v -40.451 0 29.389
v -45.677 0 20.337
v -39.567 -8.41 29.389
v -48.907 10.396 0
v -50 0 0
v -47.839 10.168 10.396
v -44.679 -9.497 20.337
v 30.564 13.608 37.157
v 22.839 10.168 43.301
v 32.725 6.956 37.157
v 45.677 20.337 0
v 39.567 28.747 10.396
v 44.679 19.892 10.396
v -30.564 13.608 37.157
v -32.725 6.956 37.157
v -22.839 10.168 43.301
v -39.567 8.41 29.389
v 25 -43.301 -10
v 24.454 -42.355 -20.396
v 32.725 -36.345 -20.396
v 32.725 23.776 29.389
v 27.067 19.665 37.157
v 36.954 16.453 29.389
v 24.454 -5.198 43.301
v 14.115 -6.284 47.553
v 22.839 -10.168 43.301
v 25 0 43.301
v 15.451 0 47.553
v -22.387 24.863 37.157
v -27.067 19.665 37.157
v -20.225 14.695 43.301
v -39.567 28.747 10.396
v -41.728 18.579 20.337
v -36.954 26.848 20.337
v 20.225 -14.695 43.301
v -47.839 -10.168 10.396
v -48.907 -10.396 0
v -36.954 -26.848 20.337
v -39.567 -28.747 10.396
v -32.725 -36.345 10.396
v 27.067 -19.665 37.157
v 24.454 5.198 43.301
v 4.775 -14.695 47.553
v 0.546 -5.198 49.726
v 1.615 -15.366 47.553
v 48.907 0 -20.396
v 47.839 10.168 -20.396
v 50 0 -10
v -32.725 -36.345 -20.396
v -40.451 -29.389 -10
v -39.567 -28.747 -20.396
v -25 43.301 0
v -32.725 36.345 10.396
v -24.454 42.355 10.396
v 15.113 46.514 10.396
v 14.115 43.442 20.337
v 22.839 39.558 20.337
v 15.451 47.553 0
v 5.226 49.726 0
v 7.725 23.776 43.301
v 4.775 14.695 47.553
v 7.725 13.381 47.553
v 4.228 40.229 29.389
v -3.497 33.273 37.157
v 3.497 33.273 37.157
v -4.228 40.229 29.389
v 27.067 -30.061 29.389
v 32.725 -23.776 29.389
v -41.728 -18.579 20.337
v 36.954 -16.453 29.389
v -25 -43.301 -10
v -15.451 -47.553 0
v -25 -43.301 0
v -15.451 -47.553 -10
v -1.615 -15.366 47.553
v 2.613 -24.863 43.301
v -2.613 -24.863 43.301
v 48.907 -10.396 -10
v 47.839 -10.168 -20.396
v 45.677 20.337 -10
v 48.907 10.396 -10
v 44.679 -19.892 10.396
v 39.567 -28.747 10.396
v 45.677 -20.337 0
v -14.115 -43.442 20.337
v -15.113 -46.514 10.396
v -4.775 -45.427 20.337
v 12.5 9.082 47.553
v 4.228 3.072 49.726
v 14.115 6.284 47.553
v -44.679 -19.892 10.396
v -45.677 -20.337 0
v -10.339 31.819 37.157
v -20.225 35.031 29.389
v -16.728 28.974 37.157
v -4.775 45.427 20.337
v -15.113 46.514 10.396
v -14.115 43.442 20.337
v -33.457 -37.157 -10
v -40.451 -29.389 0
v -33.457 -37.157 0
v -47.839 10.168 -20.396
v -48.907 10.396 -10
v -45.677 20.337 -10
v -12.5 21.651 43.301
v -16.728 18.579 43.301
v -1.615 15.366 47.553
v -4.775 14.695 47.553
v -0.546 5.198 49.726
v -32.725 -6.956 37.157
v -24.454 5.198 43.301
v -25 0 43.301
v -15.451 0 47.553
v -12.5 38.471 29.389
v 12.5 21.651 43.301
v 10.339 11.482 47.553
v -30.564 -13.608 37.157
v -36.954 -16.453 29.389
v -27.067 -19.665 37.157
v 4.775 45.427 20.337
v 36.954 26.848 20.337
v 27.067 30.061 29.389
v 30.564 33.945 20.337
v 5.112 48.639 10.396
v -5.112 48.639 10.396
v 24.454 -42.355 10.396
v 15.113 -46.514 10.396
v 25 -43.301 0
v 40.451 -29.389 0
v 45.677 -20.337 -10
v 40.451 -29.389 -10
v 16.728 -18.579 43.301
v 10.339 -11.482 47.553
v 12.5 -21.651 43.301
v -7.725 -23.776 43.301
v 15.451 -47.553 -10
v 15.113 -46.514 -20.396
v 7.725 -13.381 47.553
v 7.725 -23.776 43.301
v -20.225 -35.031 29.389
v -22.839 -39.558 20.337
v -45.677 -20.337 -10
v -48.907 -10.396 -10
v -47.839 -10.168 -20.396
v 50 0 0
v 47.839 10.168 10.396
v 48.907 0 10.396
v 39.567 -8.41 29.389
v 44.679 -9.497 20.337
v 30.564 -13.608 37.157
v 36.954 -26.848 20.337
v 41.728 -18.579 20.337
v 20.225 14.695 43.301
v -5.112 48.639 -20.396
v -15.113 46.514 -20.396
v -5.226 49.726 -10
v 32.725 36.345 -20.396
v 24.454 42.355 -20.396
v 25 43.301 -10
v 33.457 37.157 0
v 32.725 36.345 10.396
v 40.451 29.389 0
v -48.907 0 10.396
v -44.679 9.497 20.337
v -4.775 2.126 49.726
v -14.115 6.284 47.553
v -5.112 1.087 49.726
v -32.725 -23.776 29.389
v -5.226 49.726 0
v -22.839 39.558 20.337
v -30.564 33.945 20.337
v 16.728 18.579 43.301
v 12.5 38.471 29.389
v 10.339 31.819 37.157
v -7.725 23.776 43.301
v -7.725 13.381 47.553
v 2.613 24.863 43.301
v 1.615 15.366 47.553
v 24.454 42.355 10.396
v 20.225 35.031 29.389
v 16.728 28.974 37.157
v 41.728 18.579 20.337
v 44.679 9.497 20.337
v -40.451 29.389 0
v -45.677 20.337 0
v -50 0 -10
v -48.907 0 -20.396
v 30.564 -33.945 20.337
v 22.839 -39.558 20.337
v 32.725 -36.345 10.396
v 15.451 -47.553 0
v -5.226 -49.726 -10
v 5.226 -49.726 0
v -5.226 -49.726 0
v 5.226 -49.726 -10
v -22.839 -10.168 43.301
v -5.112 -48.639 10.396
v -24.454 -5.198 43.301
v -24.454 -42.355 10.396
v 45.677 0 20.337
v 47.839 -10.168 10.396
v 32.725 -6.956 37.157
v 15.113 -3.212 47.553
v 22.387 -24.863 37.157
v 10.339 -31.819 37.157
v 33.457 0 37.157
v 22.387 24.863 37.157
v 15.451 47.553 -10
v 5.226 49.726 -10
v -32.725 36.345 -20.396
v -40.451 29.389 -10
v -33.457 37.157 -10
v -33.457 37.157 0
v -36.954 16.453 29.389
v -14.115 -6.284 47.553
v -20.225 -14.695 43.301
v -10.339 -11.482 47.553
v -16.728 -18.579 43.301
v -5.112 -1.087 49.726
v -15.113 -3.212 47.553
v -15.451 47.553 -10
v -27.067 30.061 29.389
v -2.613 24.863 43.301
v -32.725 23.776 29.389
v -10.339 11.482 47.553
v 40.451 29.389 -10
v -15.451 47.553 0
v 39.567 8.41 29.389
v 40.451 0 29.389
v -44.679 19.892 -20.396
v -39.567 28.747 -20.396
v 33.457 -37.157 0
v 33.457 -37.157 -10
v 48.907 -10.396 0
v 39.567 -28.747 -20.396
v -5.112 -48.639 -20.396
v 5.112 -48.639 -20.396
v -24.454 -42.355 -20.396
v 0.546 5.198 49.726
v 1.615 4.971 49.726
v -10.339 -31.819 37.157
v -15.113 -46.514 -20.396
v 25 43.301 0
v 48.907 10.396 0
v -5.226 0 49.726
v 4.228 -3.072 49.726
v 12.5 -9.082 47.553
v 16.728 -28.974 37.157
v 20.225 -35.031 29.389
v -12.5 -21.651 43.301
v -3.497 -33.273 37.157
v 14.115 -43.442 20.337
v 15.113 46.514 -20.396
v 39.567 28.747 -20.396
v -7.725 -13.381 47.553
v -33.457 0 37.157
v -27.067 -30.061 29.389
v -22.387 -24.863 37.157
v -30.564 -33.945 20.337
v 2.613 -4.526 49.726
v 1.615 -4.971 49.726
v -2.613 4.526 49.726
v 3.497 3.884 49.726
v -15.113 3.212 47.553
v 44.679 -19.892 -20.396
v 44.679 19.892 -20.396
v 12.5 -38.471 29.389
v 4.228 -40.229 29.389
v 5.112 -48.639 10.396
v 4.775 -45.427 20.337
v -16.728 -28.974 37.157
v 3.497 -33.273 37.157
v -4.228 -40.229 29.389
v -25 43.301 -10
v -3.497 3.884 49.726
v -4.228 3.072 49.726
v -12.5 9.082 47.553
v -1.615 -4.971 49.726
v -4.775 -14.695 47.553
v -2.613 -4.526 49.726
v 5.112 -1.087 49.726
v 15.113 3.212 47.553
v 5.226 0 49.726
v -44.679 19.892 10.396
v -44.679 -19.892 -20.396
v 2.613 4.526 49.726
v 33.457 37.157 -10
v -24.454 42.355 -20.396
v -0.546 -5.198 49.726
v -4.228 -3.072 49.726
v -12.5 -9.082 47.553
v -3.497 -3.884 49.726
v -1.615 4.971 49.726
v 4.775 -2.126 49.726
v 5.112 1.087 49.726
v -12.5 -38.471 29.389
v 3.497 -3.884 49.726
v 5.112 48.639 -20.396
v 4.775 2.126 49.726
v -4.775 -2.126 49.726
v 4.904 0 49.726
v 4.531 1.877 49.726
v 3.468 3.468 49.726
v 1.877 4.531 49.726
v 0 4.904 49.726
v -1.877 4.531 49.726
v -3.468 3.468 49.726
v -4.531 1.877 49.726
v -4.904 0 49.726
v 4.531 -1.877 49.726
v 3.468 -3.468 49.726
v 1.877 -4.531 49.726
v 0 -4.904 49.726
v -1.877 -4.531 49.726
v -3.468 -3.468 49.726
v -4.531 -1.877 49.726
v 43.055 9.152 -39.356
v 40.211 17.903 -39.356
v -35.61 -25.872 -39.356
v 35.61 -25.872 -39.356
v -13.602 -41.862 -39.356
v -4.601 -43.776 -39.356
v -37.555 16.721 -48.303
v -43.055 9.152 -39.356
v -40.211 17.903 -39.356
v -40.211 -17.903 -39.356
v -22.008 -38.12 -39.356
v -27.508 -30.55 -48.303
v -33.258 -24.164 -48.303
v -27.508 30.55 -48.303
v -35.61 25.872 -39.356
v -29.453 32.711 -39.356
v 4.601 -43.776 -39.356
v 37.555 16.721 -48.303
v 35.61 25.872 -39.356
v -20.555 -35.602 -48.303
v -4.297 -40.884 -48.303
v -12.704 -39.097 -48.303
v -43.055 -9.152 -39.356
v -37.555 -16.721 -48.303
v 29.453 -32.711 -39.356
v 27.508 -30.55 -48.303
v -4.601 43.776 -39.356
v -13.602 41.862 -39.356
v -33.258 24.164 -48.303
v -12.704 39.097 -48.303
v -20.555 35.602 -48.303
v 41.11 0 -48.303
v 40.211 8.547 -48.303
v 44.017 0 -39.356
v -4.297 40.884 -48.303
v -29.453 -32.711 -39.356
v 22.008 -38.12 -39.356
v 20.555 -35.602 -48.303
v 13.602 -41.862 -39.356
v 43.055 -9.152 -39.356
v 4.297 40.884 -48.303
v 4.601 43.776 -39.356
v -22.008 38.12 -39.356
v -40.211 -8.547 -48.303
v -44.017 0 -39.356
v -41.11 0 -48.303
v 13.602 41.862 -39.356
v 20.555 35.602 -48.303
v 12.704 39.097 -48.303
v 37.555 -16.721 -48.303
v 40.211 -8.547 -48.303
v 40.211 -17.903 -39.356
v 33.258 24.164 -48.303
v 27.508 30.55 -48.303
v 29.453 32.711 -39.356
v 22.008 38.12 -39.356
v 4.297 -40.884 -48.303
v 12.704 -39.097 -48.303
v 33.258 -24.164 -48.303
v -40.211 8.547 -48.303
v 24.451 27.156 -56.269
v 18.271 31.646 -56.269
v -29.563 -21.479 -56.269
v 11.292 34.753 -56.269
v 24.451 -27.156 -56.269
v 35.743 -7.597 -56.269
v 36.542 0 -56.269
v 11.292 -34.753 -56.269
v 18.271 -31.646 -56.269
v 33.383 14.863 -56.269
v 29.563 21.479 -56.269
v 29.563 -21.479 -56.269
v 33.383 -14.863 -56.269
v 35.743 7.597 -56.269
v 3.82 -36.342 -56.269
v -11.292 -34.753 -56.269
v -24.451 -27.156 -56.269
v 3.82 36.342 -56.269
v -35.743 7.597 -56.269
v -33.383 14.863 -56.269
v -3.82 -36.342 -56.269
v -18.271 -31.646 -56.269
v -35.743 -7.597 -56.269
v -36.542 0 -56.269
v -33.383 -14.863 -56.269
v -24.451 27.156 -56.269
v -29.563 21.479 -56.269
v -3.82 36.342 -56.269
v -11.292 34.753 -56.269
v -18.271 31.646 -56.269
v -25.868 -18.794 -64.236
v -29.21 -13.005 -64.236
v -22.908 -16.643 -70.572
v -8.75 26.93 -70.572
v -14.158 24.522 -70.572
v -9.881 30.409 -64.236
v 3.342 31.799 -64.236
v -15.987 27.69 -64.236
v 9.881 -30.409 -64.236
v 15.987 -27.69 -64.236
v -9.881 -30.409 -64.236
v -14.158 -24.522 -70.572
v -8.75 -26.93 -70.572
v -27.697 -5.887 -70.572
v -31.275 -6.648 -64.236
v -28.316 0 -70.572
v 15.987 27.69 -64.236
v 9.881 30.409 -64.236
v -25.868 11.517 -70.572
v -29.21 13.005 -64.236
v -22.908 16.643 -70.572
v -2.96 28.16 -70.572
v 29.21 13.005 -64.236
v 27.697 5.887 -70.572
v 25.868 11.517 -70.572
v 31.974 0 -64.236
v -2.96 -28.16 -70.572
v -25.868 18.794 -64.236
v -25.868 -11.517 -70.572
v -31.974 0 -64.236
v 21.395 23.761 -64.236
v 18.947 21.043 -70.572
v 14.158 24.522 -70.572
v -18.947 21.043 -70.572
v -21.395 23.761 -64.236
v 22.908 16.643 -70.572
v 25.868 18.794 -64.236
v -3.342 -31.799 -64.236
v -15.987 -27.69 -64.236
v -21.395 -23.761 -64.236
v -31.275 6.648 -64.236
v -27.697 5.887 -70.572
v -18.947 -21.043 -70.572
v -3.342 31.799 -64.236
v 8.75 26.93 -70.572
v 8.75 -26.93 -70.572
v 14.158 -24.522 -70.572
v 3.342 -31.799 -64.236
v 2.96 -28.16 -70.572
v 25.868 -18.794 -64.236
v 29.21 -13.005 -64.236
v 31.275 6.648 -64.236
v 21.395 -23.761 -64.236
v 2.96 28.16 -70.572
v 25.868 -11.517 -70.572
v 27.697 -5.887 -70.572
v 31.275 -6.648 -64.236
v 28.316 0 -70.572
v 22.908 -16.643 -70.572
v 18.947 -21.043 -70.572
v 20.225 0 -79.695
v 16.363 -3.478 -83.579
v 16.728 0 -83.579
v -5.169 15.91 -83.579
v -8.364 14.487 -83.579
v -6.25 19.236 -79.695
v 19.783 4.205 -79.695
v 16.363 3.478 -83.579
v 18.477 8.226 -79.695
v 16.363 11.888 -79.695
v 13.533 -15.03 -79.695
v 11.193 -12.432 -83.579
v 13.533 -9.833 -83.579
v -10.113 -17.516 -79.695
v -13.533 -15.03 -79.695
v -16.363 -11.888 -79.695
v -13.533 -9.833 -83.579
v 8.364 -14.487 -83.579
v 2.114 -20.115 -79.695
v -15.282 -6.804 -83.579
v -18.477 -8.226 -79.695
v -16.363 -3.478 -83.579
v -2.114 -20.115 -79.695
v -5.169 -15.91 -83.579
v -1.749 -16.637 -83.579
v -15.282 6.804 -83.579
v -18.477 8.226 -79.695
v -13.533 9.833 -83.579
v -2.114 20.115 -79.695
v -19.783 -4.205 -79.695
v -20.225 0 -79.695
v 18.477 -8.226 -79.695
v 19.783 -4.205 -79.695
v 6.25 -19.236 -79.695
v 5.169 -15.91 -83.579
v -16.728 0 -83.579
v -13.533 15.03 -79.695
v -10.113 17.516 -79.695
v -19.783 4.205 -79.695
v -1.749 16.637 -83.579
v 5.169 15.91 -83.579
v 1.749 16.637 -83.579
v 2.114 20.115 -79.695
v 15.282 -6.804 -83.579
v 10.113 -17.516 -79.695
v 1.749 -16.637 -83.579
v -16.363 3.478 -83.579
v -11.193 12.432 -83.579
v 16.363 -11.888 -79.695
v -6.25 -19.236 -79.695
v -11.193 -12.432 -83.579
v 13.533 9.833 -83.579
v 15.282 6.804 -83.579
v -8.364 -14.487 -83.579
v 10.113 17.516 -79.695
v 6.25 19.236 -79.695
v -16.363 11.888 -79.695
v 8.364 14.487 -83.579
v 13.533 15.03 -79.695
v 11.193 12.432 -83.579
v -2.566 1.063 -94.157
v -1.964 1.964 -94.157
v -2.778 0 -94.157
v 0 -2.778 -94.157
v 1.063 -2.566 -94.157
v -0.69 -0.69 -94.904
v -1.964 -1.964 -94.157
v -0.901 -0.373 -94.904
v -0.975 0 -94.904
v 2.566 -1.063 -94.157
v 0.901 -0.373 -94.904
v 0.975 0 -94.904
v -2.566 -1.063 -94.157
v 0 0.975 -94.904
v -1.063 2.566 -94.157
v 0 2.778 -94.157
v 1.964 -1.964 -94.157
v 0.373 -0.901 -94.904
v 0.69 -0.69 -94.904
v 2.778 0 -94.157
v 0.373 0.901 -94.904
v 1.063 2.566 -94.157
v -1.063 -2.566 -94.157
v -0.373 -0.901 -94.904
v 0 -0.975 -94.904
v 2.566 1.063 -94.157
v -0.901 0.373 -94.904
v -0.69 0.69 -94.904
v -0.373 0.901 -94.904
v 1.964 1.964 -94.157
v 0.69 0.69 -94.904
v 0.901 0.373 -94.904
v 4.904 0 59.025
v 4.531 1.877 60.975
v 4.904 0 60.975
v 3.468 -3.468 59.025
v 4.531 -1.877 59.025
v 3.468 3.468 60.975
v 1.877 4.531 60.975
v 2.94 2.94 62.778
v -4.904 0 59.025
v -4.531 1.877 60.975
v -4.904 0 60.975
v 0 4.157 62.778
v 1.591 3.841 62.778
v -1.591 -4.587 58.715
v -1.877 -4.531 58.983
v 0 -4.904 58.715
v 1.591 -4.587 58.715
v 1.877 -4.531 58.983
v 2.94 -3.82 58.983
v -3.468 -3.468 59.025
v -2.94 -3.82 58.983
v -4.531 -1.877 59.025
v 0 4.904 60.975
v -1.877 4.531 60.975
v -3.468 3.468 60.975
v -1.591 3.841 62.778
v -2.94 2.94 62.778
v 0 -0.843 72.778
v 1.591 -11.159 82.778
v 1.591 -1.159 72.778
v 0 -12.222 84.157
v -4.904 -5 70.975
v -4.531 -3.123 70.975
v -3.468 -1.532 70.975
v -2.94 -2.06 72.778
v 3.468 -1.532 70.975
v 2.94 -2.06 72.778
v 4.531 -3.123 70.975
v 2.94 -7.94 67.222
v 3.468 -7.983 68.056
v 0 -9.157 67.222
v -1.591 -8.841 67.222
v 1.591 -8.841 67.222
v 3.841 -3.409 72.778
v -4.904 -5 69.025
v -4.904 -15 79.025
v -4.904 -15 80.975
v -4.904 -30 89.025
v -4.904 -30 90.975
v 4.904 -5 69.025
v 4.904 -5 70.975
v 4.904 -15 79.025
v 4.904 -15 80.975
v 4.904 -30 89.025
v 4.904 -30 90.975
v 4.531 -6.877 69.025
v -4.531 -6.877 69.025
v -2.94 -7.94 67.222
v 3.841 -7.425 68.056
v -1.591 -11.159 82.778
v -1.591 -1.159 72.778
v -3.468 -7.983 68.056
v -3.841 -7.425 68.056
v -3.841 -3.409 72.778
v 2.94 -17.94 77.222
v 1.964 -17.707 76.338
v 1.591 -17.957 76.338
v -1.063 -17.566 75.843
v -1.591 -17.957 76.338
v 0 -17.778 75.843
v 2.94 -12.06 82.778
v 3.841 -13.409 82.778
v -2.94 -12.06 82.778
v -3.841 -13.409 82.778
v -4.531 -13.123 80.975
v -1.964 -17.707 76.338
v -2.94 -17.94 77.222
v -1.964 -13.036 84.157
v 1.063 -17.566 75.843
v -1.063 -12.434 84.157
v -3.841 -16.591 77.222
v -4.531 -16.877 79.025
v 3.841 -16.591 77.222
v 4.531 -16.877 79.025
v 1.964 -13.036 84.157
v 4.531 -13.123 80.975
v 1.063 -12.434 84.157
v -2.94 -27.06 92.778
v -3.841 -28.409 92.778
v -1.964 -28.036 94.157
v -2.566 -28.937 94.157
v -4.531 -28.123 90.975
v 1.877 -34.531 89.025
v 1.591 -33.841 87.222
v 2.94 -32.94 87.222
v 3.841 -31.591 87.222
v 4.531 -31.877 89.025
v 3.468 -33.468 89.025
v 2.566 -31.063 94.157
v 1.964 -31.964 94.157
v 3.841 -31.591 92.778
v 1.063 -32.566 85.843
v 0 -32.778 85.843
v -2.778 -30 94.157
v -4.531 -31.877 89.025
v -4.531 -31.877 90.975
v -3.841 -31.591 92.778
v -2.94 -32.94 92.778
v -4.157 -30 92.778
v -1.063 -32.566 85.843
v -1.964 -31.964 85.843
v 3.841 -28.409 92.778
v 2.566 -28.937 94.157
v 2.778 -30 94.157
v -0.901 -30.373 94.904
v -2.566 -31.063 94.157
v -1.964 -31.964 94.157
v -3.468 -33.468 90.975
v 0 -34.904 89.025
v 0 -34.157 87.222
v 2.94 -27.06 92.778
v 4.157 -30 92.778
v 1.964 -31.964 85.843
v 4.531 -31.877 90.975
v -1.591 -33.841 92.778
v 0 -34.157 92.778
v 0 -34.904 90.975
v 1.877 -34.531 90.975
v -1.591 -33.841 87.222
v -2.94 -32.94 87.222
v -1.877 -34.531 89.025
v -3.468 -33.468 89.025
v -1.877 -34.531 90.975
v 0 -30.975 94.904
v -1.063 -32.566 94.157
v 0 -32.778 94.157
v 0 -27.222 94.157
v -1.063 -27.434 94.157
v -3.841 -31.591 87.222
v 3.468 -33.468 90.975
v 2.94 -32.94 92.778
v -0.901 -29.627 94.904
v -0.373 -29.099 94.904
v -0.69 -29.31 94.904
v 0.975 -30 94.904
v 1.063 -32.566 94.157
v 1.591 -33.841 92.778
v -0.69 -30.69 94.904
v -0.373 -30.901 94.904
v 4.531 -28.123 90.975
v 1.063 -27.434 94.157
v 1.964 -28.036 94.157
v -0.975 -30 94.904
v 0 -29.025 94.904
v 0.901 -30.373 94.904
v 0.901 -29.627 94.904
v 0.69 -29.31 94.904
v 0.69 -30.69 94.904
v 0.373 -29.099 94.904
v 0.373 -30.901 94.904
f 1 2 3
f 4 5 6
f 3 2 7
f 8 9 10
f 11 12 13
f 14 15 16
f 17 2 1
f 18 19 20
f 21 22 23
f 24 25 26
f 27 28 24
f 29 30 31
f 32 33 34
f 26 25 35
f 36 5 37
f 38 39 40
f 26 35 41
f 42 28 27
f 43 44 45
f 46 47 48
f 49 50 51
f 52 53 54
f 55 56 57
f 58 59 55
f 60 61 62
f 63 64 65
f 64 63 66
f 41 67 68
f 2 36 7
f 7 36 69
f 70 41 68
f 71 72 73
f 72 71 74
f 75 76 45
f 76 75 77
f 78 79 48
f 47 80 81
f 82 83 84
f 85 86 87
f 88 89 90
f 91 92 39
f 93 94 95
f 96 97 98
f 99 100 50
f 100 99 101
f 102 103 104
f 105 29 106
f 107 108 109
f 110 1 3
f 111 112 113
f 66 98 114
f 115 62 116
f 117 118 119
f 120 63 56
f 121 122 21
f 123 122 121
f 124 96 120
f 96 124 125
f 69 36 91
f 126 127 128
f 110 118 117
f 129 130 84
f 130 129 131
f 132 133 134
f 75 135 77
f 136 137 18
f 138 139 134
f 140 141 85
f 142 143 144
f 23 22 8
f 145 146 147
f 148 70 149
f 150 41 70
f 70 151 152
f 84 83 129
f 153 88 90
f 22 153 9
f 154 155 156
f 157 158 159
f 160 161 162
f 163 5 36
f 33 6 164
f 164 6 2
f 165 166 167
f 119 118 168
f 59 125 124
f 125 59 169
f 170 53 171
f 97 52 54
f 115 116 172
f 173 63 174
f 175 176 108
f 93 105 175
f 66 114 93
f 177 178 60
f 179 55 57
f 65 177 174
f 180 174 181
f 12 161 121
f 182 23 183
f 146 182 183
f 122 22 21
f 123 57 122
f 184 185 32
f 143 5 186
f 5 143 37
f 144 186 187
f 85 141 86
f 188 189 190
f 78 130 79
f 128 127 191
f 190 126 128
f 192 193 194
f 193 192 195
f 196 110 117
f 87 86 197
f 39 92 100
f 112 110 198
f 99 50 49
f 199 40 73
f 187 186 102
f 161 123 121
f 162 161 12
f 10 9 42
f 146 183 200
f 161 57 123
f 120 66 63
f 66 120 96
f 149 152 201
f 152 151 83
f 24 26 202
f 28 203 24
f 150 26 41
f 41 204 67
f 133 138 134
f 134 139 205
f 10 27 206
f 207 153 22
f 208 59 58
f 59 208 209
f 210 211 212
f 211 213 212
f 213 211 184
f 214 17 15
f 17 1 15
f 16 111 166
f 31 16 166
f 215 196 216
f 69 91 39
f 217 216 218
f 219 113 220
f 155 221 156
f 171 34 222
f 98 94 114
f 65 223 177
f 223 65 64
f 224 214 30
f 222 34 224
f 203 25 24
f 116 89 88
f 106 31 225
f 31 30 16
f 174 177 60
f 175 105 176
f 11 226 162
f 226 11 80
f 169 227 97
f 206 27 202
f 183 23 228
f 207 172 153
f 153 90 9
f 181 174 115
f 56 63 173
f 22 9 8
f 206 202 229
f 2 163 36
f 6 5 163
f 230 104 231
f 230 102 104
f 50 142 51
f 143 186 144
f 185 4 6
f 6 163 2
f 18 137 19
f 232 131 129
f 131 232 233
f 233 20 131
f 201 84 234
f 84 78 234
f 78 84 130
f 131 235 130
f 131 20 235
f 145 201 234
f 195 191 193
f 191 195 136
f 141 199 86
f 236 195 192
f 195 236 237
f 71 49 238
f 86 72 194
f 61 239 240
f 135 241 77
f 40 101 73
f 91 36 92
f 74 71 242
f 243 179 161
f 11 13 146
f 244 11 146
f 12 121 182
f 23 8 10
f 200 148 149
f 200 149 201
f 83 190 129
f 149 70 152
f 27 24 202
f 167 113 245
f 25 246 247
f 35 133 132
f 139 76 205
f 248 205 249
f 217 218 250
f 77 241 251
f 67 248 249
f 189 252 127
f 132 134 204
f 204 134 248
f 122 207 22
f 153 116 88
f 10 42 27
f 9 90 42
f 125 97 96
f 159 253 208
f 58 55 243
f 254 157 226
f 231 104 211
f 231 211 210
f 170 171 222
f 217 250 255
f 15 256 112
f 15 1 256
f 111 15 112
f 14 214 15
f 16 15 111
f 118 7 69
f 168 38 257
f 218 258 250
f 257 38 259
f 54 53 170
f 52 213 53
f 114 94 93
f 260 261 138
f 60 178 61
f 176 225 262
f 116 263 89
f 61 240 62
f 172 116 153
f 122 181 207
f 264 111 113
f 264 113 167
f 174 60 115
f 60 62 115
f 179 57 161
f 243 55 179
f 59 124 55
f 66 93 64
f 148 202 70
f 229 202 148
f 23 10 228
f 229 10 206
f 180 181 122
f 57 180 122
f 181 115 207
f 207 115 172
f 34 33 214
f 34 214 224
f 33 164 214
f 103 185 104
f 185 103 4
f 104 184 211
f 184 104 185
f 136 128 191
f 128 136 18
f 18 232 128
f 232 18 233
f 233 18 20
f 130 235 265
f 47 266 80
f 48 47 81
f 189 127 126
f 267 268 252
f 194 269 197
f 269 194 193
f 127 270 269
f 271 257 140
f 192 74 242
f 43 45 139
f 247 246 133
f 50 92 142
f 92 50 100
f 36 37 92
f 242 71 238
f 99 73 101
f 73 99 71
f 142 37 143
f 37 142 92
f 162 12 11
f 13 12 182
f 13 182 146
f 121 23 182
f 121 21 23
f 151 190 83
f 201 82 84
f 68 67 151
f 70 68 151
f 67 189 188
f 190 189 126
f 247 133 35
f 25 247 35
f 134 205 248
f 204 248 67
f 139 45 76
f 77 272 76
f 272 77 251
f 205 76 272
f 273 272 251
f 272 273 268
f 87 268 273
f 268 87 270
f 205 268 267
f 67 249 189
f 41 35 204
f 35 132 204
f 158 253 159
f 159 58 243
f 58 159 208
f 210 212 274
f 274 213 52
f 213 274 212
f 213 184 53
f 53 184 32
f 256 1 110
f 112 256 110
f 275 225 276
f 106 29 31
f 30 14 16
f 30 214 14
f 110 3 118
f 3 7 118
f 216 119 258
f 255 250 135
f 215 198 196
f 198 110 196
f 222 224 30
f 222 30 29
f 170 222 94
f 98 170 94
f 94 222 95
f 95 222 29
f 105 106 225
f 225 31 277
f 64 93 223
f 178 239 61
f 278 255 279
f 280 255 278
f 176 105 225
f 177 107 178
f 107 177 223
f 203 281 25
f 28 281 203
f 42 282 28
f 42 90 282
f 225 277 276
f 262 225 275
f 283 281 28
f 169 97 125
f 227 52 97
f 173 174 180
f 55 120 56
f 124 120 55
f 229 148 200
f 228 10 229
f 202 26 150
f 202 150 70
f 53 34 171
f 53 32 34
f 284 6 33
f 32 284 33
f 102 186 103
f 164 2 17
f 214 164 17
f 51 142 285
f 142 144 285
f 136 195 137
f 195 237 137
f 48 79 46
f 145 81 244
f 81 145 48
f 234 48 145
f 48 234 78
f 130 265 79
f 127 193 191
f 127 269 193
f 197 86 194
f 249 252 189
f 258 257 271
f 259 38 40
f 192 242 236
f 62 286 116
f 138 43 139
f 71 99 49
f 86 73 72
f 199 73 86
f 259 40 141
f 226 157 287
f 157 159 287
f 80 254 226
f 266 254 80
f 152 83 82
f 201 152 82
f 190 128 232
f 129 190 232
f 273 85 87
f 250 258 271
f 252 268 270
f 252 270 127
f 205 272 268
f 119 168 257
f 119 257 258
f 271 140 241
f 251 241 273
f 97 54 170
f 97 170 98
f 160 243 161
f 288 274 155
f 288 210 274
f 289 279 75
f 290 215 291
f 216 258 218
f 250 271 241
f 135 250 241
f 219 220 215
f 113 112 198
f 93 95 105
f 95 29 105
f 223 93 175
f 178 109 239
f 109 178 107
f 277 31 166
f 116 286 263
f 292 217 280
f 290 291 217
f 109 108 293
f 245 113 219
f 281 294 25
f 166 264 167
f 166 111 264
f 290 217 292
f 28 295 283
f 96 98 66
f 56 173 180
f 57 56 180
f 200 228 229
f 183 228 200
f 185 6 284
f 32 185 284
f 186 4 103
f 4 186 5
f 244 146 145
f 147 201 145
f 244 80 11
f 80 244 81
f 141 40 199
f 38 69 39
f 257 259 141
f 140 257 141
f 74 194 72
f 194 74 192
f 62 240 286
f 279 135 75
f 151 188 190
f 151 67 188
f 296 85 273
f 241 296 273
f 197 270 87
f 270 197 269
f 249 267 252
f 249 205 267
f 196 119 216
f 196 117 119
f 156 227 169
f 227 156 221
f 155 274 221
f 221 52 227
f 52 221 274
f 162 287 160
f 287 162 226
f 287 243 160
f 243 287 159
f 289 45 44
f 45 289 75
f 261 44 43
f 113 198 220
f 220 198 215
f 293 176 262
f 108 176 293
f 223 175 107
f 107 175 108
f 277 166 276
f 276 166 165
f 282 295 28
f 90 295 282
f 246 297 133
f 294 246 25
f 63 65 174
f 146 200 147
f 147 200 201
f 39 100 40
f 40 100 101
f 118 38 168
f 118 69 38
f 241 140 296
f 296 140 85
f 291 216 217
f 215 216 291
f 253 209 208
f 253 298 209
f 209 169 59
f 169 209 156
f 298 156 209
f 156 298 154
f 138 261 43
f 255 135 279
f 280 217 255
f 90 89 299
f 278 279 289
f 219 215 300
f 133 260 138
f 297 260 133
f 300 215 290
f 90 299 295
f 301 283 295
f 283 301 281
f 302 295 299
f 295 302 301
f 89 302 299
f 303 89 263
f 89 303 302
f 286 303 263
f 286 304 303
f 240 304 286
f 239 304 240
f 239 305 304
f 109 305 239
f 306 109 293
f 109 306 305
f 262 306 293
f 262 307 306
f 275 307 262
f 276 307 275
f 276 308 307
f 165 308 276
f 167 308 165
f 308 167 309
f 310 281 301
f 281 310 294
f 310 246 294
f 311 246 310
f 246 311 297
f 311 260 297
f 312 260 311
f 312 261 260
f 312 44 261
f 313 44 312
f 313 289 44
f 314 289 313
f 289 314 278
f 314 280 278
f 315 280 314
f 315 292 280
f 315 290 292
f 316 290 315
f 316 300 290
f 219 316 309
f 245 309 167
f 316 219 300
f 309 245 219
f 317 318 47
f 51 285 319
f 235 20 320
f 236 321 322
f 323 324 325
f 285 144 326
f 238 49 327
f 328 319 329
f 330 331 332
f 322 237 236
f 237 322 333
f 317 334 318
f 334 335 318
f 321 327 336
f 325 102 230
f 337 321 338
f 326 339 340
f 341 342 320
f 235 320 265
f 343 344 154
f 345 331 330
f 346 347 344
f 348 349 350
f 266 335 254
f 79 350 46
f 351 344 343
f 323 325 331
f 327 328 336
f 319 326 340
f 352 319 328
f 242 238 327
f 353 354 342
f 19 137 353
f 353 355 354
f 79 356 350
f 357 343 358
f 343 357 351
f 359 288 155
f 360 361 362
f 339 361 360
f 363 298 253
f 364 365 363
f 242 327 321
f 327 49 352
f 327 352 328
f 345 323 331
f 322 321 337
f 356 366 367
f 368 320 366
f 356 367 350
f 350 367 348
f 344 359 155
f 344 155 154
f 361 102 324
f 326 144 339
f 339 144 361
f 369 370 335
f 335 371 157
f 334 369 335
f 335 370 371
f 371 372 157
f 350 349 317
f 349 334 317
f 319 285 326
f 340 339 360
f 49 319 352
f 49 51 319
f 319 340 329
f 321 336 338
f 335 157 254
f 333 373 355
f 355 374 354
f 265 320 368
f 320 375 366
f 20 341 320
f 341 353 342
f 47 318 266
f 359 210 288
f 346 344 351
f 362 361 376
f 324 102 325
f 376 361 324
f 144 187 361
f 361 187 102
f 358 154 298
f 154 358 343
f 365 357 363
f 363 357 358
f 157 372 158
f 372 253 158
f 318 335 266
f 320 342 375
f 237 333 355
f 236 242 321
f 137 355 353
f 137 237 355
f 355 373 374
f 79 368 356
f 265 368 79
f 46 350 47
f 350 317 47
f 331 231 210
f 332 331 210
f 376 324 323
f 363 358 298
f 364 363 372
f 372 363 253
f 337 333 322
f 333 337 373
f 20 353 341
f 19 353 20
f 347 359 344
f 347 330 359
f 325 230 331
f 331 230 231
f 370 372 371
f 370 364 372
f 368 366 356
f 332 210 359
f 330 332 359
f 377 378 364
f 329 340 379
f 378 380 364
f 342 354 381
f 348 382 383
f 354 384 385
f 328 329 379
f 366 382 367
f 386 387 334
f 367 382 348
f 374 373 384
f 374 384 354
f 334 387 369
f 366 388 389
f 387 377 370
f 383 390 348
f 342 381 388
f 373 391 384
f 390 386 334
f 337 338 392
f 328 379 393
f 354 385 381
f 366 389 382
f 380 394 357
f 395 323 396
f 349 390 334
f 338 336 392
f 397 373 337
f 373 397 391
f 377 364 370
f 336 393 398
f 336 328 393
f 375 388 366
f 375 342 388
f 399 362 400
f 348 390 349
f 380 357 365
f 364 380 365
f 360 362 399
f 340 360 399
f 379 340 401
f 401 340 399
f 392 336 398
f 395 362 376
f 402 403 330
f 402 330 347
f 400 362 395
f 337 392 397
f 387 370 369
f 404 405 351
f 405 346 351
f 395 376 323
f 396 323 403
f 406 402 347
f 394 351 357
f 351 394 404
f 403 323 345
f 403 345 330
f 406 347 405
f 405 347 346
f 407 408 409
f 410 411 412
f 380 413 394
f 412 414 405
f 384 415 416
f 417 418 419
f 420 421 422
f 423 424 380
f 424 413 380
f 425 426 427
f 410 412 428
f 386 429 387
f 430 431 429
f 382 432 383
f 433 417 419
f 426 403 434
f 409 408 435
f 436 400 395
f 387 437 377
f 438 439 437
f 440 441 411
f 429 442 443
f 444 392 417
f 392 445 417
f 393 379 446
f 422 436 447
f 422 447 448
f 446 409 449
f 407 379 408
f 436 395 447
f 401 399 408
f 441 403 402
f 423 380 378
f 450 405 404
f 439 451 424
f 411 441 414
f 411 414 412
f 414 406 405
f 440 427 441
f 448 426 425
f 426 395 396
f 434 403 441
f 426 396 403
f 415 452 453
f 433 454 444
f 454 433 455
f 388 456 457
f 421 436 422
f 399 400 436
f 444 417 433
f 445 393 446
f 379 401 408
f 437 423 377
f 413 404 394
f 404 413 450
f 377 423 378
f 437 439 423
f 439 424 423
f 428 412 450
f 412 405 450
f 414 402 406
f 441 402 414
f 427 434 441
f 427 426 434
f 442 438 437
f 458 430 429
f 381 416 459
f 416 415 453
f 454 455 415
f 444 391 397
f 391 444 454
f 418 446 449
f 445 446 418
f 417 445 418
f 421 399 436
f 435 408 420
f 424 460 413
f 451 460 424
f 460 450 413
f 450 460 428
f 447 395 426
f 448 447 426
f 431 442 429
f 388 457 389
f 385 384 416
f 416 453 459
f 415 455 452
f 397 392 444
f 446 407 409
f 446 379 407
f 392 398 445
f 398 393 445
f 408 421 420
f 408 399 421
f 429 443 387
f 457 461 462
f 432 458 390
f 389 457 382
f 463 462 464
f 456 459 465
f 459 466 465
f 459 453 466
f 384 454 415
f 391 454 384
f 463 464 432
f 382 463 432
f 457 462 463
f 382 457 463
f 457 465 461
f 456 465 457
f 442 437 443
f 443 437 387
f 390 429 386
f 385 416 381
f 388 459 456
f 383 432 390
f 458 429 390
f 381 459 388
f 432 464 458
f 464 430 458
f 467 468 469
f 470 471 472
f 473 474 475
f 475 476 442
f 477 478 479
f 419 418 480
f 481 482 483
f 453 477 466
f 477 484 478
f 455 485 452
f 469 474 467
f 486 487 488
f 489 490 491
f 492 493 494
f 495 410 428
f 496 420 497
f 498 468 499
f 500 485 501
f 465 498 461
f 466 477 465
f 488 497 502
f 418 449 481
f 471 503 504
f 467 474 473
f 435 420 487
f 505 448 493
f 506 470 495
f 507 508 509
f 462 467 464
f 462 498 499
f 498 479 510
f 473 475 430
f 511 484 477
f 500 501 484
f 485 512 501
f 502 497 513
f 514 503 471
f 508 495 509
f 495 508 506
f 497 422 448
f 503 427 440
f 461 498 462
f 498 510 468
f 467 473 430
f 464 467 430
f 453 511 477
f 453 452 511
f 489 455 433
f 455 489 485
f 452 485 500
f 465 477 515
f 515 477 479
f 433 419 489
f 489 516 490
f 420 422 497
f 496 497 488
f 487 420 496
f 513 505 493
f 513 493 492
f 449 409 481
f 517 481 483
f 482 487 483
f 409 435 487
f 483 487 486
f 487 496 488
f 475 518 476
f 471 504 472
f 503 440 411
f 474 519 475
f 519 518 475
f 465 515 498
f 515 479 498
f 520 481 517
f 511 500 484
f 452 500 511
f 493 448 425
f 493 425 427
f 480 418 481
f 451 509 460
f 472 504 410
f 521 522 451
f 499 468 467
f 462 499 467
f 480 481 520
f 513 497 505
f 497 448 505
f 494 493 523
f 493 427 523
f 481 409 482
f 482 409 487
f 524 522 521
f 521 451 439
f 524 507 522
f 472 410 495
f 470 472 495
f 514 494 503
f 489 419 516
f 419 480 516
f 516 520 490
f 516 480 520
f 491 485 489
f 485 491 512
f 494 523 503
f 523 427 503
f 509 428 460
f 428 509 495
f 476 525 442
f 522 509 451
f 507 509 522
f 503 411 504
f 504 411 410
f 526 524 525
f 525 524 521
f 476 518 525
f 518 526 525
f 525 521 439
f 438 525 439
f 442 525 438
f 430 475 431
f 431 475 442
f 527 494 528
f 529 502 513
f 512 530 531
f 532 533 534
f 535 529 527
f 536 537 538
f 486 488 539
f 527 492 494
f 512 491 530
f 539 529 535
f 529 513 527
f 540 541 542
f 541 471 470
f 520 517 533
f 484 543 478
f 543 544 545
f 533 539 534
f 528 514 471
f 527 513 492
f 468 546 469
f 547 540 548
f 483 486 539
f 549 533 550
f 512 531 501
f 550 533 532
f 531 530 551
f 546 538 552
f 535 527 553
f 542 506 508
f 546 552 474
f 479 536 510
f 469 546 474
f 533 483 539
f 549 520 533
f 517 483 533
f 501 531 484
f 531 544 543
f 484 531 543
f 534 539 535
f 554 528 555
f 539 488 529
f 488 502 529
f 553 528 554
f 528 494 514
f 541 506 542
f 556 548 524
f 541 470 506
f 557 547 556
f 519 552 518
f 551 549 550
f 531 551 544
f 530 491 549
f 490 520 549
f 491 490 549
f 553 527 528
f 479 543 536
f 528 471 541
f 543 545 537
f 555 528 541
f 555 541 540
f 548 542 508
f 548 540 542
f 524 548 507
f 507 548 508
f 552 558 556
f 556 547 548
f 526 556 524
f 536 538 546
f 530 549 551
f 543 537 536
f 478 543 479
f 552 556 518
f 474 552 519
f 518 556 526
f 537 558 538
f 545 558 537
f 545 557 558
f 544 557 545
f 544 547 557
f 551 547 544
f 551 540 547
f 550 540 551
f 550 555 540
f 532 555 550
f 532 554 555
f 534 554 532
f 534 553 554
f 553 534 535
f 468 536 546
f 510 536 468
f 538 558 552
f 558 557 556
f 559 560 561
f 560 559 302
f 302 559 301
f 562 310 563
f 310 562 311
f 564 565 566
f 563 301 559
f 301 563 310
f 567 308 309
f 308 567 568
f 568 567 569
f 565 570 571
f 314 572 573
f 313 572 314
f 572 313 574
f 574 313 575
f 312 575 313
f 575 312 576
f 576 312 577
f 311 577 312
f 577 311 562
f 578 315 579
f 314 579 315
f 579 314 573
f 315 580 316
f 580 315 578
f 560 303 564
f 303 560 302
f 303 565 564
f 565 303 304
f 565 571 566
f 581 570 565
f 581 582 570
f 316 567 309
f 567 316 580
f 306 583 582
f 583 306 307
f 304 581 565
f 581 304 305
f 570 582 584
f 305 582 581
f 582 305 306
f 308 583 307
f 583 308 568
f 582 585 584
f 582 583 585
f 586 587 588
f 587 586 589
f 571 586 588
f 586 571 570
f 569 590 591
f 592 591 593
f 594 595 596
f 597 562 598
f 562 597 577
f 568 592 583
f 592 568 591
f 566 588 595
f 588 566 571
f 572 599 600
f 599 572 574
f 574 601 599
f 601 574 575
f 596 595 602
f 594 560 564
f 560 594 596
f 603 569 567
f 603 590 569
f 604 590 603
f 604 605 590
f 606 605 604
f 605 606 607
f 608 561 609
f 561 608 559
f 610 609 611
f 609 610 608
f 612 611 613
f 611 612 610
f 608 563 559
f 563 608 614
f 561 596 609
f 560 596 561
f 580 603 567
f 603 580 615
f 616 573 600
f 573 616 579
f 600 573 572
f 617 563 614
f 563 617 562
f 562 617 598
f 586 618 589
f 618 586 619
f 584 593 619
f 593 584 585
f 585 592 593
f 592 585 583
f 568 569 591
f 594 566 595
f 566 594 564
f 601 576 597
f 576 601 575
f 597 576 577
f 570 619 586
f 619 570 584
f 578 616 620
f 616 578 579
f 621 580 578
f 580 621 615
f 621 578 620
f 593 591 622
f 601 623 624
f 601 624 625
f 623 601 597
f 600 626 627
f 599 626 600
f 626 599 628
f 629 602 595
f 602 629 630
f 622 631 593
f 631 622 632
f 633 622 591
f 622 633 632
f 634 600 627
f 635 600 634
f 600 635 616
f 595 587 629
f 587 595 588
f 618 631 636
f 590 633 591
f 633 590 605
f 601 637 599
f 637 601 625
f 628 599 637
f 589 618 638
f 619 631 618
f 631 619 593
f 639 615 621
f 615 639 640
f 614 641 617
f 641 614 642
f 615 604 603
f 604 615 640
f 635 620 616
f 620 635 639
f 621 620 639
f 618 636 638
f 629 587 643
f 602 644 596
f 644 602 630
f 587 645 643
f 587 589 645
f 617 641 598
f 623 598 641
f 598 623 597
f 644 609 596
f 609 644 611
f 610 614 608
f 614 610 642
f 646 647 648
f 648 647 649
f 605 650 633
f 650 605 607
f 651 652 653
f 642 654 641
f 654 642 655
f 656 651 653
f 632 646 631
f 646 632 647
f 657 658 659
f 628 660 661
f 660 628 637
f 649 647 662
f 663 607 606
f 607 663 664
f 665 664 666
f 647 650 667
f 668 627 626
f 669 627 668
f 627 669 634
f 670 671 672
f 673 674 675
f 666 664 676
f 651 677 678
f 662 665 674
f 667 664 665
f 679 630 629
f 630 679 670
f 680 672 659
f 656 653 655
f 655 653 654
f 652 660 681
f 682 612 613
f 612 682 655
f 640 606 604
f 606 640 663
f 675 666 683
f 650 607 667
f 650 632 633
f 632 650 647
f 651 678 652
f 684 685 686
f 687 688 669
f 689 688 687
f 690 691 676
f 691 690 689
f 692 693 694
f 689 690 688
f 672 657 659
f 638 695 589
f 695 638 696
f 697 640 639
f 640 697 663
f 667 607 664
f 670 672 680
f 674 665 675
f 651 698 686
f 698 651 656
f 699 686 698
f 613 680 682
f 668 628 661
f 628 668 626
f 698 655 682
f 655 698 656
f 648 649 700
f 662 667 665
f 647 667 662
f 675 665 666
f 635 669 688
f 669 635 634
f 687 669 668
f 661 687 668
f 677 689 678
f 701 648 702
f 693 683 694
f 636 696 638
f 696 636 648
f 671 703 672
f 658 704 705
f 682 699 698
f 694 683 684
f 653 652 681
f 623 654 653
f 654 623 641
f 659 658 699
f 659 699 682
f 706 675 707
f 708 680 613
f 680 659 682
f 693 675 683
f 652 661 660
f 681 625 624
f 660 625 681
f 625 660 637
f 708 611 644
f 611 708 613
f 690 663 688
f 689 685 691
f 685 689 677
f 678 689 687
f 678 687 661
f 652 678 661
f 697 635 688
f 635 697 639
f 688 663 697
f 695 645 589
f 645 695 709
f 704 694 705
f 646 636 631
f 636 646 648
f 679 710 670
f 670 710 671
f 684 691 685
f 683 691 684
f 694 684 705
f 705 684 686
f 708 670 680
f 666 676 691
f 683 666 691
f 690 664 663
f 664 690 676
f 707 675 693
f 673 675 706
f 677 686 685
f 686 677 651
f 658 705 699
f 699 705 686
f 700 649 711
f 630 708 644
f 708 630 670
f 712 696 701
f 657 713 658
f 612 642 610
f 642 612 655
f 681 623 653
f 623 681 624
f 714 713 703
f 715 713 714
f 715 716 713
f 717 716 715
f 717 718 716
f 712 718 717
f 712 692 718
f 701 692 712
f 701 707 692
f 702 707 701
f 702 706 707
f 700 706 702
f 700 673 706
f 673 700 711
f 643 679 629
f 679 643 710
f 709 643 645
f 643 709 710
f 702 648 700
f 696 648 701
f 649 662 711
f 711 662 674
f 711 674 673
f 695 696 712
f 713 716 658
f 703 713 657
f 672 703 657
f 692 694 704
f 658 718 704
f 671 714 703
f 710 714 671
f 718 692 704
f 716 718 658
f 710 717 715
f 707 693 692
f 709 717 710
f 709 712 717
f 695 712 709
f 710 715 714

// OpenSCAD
module qip(color1=[0.8,0.2,0.2],color2=[0.8,0.2,0.2]){
    
    fruit_parts=[
        [[0,0,0],50,color1],
        [[0,0,-10],50,(0.8*color1 + 0.2*color2)],
        [[0,0,-30],45,(0.6*color1 + 0.4*color2)],
        [[0,0,-40],40,(0.4*color1 + 0.6*color2)],
        [[0,0,-50],35,(0.2*color1 + 0.8*color2)],
        [[0,0,-65],25,color2],
        [[0,0,-90],5,color2]
    ];
    
    /*
    hull(){
        translate([0,0,0]){sphere(50);}
        translate([0,0,-10]){sphere(50);}
        translate([0,0,-30]){sphere(45);}
        translate([0,0,-40]){sphere(40);}
        translate([0,0,-50]){sphere(35);}
        translate([0,0,-65]){sphere(25);}
        translate([0,0,-90]){sphere(5);}
    }
    */
    
    for(i=[0:1:len(fruit_parts)-2]){
        color(fruit_parts[i][2]){
            hull(){
                translate(fruit_parts[i][0]){sphere(fruit_parts[i][1]);}
                translate(fruit_parts[i+1][0]){sphere(fruit_parts[i+1][1]);}
            }
        }
    }
}

qip([0.8,0.2,0.2],[0.8,0.6,0.2]);
color([0.2,0.8,0.2]){
    hull(){
        translate([0,0,50]){sphere(5);}
        translate([0,0,60]){sphere(5);}
    }
    hull(){
        translate([0,0,60]){sphere(5);}
        translate([0,-5,70]){sphere(5);}
    }
    hull(){
        translate([0,-5,70]){sphere(5);}
        translate([0,-15,80]){sphere(5);}
    }
    hull(){
        translate([0,-15,80]){sphere(5);}
        translate([0,-30,90]){sphere(5);}
    }
}

$vpd=500;
$vpr=[80,0,20];
$vpt=[0,0,-15];
